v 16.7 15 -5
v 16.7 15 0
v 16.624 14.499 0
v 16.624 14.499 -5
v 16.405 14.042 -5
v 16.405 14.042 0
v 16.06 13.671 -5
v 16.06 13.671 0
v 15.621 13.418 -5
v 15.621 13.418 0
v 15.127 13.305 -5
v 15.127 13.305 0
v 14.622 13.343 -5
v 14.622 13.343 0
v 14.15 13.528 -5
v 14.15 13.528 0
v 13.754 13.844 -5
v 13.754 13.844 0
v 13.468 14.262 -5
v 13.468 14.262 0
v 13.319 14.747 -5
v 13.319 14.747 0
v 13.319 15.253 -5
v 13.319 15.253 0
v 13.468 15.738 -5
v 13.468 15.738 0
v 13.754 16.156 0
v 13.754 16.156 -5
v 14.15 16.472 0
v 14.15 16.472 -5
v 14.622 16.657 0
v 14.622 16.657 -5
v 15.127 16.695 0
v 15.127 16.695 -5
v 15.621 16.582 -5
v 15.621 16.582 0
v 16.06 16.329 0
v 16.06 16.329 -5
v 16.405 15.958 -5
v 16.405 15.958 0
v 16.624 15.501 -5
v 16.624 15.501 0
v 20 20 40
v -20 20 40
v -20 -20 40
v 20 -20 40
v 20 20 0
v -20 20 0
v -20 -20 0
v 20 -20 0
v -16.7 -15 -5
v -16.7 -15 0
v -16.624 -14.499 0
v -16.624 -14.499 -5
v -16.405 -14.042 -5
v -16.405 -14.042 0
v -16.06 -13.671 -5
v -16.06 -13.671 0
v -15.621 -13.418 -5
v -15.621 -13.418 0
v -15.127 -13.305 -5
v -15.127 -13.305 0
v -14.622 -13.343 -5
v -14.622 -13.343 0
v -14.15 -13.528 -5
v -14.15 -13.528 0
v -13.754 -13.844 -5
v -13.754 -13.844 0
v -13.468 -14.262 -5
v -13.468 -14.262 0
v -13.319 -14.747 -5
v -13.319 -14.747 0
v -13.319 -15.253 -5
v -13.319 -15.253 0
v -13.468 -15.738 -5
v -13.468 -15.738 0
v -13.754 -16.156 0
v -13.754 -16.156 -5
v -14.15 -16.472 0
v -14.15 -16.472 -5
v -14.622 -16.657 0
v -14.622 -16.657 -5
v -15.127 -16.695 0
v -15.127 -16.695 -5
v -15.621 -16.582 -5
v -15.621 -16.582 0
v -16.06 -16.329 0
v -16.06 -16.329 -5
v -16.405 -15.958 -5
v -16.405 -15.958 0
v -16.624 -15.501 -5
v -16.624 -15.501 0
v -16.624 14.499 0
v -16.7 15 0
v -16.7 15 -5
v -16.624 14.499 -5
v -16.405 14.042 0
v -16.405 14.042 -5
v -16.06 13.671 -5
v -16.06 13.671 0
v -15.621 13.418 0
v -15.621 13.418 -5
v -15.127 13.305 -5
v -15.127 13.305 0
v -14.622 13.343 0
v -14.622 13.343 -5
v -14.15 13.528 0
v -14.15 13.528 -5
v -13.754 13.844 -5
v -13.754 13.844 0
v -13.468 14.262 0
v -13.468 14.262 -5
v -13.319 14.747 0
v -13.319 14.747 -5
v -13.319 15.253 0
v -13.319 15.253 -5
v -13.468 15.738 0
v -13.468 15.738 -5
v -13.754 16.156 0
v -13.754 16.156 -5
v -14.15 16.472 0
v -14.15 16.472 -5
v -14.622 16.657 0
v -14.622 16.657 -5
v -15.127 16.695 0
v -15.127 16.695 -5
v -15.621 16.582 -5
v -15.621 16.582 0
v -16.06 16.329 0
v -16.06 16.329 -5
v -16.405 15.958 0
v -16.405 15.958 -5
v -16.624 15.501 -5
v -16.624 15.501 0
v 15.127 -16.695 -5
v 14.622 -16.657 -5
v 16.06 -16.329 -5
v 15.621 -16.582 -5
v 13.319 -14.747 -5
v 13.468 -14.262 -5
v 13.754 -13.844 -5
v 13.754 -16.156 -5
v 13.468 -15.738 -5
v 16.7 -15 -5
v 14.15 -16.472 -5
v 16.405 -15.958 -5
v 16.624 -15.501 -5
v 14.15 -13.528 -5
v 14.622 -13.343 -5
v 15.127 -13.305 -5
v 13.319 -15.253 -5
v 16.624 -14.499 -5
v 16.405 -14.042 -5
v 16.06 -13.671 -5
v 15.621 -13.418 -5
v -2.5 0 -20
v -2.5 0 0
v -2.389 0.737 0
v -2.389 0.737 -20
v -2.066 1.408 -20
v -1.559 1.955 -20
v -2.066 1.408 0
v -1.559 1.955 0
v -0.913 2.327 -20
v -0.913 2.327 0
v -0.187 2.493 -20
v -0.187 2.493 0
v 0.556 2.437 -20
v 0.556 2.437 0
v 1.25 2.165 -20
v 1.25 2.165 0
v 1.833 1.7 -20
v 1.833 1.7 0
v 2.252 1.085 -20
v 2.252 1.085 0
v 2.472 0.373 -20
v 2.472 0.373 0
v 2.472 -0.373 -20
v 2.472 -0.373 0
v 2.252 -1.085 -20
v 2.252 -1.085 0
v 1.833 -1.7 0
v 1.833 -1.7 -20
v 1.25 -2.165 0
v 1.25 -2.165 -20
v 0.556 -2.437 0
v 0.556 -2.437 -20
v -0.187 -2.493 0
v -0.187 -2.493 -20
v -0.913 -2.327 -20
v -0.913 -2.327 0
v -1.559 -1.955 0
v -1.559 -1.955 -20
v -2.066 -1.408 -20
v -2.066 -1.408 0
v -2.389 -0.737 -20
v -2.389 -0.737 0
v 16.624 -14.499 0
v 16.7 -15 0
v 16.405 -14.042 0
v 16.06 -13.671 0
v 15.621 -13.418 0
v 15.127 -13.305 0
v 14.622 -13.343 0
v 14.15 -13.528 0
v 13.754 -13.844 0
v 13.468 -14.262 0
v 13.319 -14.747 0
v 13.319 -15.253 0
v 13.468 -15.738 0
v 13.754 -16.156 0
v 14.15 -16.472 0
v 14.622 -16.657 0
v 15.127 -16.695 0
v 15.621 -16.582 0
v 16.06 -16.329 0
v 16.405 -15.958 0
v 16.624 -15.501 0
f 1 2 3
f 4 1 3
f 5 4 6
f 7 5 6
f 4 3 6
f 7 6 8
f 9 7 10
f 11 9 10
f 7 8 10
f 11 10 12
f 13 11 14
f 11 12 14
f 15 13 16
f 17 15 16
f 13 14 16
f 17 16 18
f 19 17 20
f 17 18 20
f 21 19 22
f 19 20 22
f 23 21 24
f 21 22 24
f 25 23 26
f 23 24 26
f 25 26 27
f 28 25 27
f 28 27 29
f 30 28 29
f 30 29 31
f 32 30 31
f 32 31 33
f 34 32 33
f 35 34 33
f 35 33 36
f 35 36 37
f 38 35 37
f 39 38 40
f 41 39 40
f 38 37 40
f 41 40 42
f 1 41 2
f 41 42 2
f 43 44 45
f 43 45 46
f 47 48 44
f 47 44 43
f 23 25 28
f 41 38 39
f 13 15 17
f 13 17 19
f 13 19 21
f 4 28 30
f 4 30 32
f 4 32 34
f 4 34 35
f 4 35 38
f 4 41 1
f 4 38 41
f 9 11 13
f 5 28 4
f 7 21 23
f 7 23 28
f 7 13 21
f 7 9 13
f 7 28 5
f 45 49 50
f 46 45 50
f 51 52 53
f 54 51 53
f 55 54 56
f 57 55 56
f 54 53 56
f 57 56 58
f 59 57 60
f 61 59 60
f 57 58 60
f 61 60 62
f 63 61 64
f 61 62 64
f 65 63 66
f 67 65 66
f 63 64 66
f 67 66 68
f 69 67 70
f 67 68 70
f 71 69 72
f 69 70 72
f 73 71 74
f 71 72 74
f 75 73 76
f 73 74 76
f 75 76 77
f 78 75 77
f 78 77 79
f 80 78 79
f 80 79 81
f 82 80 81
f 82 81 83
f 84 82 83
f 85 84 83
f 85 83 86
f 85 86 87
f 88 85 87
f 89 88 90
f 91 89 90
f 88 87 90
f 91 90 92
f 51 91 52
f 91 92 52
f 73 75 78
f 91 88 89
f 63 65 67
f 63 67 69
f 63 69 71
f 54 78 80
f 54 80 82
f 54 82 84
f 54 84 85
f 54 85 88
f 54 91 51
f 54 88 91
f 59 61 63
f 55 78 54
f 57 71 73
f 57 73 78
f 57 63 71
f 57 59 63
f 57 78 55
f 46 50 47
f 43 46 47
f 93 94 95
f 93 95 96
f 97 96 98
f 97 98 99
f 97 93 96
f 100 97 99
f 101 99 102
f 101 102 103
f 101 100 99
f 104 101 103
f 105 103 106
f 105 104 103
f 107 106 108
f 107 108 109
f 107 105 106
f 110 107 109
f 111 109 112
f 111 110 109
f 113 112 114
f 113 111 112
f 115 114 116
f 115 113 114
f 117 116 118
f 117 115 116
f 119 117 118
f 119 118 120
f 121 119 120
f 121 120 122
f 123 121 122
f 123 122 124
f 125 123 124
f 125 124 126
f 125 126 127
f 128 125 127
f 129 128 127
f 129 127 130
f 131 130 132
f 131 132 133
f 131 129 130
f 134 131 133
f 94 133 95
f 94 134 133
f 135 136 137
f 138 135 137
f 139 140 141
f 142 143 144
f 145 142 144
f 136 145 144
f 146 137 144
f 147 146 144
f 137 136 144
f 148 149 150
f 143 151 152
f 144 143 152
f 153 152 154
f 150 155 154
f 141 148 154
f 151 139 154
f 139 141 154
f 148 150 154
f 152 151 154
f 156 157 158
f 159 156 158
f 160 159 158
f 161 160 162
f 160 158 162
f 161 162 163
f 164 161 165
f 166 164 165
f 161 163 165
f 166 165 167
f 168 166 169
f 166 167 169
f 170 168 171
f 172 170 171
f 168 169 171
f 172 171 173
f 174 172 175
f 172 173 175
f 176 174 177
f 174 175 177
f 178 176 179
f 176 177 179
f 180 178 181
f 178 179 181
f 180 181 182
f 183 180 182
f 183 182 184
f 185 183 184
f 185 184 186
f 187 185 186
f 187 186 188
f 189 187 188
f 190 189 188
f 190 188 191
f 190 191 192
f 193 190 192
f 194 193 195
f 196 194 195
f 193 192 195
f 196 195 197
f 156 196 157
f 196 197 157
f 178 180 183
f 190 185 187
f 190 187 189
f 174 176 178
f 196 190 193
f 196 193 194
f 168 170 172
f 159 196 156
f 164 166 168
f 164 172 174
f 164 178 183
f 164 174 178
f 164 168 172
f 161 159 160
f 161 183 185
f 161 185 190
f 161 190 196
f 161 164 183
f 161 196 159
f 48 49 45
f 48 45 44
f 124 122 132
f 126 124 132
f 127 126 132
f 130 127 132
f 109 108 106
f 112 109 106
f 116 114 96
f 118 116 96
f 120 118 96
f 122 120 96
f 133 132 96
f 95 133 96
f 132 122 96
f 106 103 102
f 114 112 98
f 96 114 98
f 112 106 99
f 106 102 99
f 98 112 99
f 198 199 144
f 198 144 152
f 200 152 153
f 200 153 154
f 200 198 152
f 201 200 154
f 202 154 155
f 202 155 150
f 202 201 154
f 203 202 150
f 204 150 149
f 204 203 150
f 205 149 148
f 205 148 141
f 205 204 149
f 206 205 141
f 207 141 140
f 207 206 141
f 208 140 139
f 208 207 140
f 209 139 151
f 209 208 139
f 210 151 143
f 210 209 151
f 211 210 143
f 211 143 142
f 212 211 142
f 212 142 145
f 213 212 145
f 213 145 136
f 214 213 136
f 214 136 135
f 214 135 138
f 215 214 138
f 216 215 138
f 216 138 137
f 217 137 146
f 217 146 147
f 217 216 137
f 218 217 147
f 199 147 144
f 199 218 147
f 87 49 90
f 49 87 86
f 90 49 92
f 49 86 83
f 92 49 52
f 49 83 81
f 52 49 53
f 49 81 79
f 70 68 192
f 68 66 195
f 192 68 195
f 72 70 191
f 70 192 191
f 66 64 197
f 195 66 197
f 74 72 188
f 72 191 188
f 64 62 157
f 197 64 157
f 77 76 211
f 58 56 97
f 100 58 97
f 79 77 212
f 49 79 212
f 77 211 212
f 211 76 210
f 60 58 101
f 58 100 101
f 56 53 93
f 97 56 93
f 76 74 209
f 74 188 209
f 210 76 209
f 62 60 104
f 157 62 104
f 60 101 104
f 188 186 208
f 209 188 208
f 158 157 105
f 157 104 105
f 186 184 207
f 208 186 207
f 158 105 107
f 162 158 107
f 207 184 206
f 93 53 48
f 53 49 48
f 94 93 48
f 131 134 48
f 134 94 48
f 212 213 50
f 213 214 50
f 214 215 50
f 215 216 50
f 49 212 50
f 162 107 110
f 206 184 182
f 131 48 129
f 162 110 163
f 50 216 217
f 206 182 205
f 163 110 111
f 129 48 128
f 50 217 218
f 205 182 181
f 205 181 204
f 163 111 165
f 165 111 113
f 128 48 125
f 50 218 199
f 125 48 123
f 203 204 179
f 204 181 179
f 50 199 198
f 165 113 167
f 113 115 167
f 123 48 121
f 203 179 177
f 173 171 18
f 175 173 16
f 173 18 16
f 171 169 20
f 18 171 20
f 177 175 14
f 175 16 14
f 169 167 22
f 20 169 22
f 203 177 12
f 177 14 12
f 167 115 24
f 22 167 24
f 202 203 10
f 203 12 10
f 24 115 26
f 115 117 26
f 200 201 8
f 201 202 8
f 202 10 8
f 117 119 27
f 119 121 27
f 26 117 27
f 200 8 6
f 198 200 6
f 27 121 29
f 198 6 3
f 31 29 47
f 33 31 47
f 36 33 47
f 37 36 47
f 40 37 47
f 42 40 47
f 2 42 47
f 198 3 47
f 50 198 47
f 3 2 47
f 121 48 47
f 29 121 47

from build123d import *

# Parameters (mm, degrees)
SKETCH1_W               = 40
SKETCH1_H               = 40
BOSS_EXTRUDE1_DEPTH     = 40
SKETCH2_R               = 1.7
BOSS_EXTRUDE2_DEPTH     = 5
MIRROR2_COPY_1_SKETCH_R = 1.7
MIRROR2_COPY_1_DEPTH    = 5
SKETCH3_R               = 2.5
BOSS_EXTRUDE3_DEPTH     = 20


with BuildPart() as part:
    # Sketch1 → Boss-Extrude1 (new body)
    with BuildSketch(Plane.XY):
        Rectangle(SKETCH1_W, SKETCH1_H)
    extrude(amount=BOSS_EXTRUDE1_DEPTH)

    # Sketch2 → Boss-Extrude2 (add)
    with BuildSketch(Plane(origin=(0, 0, 0), x_dir=(-1, 0, 0), z_dir=(0, 0, -1))):
        with Locations((15, -15)):
            Circle(SKETCH2_R)
    boss_extrude2 = extrude(amount=BOSS_EXTRUDE2_DEPTH)

    # Mirror1: Boss-Extrude2 across plane
    add(boss_extrude2.mirror(Plane(origin=(0, 0, 0), x_dir=(0, 0, 1), z_dir=(1, 0, 0))))

    # Mirror2: Boss-Extrude2 across plane
    add(boss_extrude2.mirror(Plane.ZX))

    # Mirror2 copy 1 sketch → Mirror2 copy 1 (add)
    with BuildSketch(Plane(origin=(0, 0, 0), x_dir=(1, 0, 0), z_dir=(0, 0, -1))):
        with Locations((15, -15)):
            Circle(MIRROR2_COPY_1_SKETCH_R)
    extrude(amount=MIRROR2_COPY_1_DEPTH)

    # Sketch3 → Boss-Extrude3 (add)
    with BuildSketch(Plane(origin=(0, 0, 0), x_dir=(-1, 0, 0), z_dir=(0, 0, -1))):
        Circle(SKETCH3_R)
    extrude(amount=BOSS_EXTRUDE3_DEPTH)


solid = part.part
